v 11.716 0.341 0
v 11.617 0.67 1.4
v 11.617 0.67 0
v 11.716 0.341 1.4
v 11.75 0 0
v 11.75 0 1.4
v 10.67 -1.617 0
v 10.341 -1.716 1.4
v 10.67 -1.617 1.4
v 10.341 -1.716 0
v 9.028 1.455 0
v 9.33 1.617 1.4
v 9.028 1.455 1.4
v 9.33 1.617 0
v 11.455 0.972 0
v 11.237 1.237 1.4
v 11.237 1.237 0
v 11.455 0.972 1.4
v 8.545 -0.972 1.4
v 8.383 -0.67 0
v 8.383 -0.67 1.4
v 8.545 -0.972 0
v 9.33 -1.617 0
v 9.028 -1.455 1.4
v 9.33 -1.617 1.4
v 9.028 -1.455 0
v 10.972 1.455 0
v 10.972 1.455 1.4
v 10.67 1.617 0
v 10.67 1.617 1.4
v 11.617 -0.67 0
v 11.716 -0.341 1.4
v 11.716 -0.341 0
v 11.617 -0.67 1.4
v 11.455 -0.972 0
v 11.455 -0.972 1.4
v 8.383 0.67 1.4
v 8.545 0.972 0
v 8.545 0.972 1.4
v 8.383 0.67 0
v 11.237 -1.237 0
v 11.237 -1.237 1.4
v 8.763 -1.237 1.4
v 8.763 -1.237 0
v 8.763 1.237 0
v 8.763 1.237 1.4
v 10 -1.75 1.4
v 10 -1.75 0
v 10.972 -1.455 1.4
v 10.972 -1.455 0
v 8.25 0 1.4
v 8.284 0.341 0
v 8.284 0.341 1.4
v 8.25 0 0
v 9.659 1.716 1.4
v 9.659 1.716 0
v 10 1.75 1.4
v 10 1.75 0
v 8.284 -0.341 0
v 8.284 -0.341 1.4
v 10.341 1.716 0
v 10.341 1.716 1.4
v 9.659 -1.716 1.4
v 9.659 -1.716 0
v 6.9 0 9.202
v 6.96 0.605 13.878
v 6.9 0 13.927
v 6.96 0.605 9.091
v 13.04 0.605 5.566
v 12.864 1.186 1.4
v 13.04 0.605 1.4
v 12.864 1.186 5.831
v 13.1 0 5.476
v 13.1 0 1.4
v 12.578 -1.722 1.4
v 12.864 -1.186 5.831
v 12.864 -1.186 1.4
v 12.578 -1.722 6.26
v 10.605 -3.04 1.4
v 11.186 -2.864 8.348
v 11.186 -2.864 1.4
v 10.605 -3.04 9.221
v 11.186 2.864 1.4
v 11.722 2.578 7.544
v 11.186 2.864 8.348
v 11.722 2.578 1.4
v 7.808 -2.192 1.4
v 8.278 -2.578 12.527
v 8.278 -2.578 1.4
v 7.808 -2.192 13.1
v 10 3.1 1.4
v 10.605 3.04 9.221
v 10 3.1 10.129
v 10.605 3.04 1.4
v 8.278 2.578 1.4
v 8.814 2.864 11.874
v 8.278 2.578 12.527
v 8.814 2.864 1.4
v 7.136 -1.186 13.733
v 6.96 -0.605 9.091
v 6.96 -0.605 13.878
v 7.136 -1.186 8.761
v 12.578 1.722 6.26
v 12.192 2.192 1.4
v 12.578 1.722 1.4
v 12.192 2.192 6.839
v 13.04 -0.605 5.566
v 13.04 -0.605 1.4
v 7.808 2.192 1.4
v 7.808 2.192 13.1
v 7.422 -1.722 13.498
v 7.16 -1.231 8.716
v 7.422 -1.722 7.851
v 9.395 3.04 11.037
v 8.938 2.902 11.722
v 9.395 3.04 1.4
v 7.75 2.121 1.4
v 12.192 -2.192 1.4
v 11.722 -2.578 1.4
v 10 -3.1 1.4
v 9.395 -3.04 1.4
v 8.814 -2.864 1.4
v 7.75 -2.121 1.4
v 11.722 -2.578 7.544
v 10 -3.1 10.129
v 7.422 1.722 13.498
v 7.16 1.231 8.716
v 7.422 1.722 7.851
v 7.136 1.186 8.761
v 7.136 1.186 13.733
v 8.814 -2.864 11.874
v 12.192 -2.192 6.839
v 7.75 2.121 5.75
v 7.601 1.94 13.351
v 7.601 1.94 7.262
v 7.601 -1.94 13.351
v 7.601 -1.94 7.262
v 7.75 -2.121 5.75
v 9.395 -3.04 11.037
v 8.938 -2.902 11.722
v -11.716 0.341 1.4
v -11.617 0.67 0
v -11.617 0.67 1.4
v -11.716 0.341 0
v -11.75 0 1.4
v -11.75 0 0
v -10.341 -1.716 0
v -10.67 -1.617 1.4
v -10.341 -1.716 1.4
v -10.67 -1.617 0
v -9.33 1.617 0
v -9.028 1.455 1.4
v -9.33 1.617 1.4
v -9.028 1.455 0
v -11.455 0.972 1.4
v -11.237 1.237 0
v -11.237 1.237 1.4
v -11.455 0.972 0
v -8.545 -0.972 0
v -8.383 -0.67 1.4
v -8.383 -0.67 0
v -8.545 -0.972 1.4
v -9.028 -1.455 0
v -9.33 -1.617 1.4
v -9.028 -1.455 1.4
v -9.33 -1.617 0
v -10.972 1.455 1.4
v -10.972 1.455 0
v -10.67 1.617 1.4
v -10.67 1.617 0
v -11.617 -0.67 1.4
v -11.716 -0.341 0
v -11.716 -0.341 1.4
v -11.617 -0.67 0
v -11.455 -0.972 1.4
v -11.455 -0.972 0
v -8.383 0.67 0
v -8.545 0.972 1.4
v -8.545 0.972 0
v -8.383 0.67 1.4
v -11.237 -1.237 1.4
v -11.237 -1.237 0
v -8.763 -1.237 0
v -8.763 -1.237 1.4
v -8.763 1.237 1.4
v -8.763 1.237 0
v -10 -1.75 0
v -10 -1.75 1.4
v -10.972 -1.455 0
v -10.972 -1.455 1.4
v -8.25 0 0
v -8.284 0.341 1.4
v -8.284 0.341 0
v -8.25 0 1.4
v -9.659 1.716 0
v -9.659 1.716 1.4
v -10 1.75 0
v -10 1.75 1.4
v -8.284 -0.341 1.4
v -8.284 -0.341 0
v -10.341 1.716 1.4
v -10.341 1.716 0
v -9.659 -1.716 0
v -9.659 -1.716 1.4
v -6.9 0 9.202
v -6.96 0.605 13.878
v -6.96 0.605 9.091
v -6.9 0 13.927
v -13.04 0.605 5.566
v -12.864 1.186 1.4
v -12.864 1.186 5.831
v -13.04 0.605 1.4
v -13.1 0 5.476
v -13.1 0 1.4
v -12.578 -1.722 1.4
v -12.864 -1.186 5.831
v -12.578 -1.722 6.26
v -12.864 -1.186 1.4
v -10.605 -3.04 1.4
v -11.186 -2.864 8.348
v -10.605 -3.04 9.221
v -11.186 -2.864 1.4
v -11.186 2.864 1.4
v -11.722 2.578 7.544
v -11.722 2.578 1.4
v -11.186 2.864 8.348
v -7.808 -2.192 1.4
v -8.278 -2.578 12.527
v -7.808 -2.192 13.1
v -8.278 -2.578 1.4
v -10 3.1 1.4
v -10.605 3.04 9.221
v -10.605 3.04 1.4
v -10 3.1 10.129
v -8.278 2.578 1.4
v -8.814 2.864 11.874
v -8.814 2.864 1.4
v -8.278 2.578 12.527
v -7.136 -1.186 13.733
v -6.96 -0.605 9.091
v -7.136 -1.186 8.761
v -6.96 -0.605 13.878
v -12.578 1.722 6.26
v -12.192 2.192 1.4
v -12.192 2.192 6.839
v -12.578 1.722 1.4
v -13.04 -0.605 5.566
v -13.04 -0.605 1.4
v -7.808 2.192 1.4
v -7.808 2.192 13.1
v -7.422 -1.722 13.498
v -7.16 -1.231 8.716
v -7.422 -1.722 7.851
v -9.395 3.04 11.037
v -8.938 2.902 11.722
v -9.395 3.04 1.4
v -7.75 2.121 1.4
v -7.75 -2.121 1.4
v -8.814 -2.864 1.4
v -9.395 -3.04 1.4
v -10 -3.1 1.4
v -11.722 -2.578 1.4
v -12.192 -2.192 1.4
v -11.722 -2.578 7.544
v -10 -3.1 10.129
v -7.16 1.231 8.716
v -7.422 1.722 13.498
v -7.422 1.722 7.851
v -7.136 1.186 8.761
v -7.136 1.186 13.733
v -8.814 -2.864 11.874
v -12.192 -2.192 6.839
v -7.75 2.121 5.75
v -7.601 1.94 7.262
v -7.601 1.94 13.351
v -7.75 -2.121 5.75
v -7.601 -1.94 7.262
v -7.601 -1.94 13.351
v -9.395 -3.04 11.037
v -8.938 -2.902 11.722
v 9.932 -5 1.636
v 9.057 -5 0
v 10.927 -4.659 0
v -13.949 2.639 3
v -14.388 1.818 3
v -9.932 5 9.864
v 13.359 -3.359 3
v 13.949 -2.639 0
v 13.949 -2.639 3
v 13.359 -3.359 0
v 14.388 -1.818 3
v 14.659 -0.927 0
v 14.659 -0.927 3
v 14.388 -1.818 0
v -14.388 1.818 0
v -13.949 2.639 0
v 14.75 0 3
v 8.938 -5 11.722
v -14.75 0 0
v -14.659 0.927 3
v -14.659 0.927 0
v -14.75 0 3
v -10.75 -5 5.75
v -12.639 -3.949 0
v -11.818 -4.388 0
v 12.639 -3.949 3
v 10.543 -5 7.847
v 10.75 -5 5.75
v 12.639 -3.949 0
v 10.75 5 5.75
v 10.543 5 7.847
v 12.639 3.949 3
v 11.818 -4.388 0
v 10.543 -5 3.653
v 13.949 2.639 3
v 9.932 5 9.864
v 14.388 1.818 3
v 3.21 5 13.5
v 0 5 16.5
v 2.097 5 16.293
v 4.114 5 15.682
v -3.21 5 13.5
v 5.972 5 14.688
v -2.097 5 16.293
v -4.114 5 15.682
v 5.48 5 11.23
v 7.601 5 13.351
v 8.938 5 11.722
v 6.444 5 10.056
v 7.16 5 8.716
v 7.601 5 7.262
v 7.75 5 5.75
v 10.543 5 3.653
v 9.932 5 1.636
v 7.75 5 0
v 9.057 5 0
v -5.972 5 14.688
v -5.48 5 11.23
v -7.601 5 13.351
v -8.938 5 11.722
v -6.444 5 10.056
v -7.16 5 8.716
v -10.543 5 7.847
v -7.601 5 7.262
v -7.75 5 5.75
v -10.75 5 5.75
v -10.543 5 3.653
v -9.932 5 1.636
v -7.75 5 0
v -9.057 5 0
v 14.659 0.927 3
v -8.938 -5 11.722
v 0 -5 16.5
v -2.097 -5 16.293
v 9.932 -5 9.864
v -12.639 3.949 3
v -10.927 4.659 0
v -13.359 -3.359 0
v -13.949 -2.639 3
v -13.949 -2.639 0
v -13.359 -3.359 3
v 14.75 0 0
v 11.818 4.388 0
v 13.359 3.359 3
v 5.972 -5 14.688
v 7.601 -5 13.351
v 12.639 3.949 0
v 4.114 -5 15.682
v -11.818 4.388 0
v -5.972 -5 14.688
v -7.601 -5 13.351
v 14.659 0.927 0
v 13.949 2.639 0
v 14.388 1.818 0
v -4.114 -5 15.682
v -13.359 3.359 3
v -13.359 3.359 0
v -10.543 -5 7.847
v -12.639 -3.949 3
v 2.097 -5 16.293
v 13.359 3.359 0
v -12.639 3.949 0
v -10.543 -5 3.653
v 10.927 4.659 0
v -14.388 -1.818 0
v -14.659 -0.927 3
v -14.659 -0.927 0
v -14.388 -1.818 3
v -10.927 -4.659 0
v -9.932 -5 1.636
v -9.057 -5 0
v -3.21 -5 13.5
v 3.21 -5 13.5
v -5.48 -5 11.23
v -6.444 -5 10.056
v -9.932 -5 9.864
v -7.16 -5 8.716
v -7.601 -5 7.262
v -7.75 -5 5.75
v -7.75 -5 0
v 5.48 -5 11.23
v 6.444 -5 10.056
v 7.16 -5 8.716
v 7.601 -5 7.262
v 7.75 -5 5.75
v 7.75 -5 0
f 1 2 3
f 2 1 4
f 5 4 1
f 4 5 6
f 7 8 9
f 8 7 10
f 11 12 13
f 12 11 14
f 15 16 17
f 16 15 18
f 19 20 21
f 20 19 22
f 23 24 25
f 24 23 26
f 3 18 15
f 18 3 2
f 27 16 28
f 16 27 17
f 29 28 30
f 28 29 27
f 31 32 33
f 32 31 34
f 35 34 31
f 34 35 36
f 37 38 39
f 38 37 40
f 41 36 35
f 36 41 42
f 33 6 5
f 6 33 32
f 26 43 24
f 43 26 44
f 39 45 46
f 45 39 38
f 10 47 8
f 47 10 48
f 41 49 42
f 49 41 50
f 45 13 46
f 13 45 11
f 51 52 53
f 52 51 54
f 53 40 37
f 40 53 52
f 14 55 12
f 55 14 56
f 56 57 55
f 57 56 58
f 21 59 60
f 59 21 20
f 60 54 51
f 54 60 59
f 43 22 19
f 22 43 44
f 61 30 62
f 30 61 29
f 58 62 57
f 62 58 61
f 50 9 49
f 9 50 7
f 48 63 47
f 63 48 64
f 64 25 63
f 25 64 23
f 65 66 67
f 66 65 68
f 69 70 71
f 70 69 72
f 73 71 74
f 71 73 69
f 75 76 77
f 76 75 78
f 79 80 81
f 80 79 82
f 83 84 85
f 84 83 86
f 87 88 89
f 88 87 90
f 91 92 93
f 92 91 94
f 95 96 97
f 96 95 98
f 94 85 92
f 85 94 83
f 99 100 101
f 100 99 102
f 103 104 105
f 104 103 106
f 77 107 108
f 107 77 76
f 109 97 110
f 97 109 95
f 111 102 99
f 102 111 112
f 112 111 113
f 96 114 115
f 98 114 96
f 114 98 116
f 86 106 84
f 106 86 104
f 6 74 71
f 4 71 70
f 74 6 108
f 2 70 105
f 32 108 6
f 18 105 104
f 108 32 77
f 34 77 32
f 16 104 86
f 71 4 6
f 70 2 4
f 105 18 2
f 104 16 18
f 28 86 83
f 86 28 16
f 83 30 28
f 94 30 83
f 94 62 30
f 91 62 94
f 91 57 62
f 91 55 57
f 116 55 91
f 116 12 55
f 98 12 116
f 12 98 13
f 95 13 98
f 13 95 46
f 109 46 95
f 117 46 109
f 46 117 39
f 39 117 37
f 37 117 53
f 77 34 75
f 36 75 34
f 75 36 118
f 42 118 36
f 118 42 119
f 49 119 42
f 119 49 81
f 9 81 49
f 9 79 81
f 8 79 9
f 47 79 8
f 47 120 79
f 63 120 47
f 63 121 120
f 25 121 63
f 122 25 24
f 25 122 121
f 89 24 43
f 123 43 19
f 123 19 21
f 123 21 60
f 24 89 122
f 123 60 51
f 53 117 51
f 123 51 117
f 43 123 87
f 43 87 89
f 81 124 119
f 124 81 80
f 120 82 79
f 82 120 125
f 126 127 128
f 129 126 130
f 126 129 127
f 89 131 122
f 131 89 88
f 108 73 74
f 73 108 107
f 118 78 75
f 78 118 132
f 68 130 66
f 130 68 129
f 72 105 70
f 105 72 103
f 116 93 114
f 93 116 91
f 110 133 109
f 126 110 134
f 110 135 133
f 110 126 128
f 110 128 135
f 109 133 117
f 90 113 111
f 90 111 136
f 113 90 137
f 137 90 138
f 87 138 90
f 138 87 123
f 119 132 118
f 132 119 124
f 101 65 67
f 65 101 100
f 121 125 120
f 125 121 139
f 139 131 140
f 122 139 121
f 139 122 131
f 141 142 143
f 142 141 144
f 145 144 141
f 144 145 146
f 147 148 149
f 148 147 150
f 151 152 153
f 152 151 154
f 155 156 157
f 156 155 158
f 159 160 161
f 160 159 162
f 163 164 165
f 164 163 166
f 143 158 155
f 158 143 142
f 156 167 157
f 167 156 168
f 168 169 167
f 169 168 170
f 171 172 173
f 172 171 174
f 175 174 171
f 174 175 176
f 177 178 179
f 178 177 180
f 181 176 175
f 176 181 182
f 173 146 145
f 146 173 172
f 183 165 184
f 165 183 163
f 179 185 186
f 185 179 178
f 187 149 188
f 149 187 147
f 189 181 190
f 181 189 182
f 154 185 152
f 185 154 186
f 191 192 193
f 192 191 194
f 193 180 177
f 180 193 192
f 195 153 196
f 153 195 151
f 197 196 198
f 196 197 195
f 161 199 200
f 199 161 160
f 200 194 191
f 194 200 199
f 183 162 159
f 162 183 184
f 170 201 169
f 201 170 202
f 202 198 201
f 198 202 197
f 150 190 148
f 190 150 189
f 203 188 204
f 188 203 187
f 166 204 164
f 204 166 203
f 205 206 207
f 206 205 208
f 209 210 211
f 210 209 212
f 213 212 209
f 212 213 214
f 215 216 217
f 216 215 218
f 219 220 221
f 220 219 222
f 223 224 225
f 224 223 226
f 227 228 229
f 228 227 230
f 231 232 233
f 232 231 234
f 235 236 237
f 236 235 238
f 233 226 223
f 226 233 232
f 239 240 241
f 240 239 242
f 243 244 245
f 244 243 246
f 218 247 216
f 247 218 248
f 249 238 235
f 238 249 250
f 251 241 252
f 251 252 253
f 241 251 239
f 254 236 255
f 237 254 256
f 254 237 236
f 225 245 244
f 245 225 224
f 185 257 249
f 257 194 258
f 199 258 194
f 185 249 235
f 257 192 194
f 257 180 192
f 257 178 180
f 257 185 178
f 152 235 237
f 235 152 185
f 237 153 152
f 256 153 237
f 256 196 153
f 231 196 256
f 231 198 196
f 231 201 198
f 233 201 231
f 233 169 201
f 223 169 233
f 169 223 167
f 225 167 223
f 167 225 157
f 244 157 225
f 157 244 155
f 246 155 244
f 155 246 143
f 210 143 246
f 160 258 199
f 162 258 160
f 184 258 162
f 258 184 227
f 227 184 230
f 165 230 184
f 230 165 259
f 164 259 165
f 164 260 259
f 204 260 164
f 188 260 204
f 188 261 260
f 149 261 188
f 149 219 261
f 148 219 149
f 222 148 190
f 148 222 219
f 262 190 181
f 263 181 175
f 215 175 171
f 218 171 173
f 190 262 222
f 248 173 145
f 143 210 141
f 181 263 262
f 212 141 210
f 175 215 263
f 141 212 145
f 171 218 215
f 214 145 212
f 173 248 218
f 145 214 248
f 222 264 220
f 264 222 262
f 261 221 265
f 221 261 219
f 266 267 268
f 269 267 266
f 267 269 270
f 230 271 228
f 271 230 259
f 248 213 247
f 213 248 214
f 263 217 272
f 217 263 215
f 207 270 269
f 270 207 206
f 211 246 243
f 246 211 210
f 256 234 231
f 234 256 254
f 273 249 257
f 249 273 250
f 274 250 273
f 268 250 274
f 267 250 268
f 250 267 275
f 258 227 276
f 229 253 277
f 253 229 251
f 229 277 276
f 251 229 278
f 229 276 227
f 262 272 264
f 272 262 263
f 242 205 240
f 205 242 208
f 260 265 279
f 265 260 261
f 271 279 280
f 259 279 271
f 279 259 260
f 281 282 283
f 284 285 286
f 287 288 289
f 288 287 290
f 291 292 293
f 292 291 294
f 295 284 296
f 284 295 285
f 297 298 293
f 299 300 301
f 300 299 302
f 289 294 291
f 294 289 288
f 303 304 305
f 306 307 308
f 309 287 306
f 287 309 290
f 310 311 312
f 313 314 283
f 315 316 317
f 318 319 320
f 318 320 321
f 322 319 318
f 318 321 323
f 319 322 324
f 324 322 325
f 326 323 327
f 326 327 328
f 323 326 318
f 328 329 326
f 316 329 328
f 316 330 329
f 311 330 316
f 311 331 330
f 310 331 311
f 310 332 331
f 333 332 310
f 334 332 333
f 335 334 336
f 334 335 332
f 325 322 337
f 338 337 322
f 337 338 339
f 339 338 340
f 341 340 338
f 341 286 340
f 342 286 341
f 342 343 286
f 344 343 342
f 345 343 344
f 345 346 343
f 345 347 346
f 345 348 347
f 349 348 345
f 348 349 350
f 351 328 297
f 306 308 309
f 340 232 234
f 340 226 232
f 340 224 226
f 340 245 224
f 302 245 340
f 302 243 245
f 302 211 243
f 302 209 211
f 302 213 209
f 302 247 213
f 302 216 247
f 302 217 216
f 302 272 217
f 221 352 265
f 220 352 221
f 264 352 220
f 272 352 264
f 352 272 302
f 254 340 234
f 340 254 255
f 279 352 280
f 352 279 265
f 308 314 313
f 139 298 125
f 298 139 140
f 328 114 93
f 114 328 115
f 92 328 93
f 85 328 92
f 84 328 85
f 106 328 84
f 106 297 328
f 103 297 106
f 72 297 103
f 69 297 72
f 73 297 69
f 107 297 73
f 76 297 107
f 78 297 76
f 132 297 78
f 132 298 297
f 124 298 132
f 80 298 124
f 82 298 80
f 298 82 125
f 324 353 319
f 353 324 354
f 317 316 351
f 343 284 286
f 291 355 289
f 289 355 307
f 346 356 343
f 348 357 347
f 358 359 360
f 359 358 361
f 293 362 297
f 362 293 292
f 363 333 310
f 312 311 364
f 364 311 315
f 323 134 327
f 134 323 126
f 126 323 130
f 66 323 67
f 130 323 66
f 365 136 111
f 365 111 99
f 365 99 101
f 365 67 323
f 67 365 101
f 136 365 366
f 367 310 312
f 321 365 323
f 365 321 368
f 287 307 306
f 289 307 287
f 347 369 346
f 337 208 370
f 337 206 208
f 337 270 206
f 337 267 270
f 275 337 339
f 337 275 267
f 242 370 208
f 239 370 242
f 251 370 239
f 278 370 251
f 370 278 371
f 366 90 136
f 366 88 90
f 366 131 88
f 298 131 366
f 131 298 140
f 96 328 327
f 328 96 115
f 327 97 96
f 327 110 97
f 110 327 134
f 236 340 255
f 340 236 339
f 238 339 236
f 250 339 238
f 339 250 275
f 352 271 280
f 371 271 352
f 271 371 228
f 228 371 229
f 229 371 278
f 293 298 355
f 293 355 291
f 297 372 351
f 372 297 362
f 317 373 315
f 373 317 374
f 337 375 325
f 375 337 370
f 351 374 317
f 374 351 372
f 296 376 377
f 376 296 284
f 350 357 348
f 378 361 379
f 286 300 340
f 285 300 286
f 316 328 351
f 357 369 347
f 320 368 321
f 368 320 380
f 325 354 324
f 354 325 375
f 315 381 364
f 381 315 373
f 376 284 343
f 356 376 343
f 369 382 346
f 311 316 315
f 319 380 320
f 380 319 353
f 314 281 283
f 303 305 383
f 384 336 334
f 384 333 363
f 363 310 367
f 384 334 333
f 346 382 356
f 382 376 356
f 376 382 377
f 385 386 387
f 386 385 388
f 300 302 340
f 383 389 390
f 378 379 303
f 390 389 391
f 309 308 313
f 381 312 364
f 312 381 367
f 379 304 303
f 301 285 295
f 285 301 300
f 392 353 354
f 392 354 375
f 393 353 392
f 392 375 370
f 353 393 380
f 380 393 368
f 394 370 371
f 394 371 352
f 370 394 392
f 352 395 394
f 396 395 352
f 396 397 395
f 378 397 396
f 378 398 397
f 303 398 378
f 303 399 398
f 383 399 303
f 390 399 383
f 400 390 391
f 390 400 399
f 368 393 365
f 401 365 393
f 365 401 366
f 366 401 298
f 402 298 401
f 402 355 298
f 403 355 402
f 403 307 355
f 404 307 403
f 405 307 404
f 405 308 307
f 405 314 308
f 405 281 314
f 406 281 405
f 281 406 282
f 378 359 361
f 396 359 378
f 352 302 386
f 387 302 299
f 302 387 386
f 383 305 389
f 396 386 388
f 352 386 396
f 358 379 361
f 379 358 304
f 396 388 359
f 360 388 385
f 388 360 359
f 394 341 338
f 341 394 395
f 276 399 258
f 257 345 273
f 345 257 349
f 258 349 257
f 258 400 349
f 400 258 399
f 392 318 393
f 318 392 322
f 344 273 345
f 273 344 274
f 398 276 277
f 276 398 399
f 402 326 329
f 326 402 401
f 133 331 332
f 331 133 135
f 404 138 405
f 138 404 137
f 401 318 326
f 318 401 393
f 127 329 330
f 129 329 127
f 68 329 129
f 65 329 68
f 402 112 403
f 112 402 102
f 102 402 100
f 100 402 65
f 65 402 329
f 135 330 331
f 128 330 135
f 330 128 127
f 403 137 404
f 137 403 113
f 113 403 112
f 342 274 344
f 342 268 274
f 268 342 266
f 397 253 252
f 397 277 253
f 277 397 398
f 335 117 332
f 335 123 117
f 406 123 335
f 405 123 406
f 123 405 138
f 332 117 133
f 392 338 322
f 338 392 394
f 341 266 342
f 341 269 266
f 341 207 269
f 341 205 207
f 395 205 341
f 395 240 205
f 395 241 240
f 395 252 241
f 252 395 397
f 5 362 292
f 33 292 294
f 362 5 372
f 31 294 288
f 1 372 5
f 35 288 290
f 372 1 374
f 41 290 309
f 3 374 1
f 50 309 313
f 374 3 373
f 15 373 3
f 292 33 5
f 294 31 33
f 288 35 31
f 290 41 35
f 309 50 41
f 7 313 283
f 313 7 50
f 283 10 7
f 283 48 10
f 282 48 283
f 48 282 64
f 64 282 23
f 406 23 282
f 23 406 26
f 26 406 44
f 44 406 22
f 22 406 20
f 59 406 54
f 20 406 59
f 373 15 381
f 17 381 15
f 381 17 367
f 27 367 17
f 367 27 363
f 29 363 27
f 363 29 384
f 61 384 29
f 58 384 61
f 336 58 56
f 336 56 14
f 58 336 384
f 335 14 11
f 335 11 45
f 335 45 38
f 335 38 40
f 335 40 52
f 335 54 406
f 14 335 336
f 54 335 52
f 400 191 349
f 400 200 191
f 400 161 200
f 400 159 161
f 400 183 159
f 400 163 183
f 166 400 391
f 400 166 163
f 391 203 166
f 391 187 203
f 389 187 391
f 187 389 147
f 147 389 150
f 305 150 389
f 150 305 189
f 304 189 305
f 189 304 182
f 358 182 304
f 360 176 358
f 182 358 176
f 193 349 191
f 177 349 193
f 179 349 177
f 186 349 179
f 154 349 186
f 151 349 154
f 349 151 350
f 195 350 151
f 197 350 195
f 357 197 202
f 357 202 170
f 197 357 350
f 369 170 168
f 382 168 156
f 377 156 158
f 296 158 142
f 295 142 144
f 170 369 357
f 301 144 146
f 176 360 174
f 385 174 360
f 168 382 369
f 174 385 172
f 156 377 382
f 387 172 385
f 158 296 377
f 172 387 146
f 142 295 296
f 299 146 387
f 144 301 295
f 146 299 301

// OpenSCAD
slop = .25;

m3_dia = 3;
m3_rad = m3_dia/2+slop;

m3_cap_dia = 5.7;
m3_cap_rad = m3_cap_dia/2+slop;
m3_cap_thick = 1.65+slop/2;
m3_cap_hex_rad = (2/cos(30))/2;

m3_nut_dia = 6.4;
m3_nut_rad = m3_nut_dia/2+slop;
m3_nut_thick = 2.4+slop;


lm8uu_dia = 15;
lm8uu_rad = lm8uu_dia/2+slop;
lm8uu_len = 24+slop;

lm8uu_inset = 2;  //inset into frame

wall = 3;
width = 10;
hole_sep = 20;

$fn=32;

bearing_clamp();

module bearing_clamp(){
	difference(){
		hull(){
			rotate([-90,0,0]) translate([0,lm8uu_inset-lm8uu_rad,0]) cylinder(r=lm8uu_rad+wall, h=width, center=true);

			for(i=[0,1]) mirror([i,0,0]) translate([hole_sep/2,0,0]) cylinder(r=m3_rad+wall, h=wall);
		}

		//bearing
		rotate([-90,0,0]) hull(){
			translate([0,lm8uu_inset-lm8uu_rad,0]) cap_cylinder(r=lm8uu_rad, h=lm8uu_len, center=true);
			cap_cylinder(r=lm8uu_rad, h=lm8uu_len, center=true);
		}

		//screwholes
		for(i=[0,1]) mirror([i,0,0]) translate([hole_sep/2,0,-.1]) {
			cylinder(r=m3_rad, h=wall+.1);
			translate([0,0,wall/2]) cylinder(r=m3_cap_rad, h=lm8uu_dia);
		}

		translate([0,0,-50]) cube([100,100,100], center=true); 
	}
}


module cap_screw(len = 10){
	color([.25,.25,.25])
	difference(){
		union(){
			translate([0,0,-len/2]) rotate([0,0,-90]) cap_cylinder(r=screw_rad, h=len, center=true);
			translate([0,0,len/2-.1]) difference(){
				scale([1,1,.75]) sphere(r=cap_rad);
				translate([0,0,-cap_dia/2]) cube([cap_dia+1, cap_dia+1, cap_dia],center=true);
				translate([0,0,cap_dia/2+.1+cap_thick]) cube([cap_dia+1, cap_dia+1, cap_dia],center=true);
			}
		}
		
		translate([0,0,len/2+slop]) cylinder(r=cap_hex_rad, h=cap_thick, $fn=6);
	}
}

module cap_cylinder(r=1, h=1, center=false){
	cylinder(r=r, h=h, center=center);
	intersection(){
		rotate([0,0,22.5]) cylinder(r=r/cos(180/8), h=h, $fn=8, center=center);
		translate([0,-r/cos(180/4),0]) rotate([0,0,0]) cylinder(r=r/cos(180/4), h=h, $fn=4, center=center);
	}
}
